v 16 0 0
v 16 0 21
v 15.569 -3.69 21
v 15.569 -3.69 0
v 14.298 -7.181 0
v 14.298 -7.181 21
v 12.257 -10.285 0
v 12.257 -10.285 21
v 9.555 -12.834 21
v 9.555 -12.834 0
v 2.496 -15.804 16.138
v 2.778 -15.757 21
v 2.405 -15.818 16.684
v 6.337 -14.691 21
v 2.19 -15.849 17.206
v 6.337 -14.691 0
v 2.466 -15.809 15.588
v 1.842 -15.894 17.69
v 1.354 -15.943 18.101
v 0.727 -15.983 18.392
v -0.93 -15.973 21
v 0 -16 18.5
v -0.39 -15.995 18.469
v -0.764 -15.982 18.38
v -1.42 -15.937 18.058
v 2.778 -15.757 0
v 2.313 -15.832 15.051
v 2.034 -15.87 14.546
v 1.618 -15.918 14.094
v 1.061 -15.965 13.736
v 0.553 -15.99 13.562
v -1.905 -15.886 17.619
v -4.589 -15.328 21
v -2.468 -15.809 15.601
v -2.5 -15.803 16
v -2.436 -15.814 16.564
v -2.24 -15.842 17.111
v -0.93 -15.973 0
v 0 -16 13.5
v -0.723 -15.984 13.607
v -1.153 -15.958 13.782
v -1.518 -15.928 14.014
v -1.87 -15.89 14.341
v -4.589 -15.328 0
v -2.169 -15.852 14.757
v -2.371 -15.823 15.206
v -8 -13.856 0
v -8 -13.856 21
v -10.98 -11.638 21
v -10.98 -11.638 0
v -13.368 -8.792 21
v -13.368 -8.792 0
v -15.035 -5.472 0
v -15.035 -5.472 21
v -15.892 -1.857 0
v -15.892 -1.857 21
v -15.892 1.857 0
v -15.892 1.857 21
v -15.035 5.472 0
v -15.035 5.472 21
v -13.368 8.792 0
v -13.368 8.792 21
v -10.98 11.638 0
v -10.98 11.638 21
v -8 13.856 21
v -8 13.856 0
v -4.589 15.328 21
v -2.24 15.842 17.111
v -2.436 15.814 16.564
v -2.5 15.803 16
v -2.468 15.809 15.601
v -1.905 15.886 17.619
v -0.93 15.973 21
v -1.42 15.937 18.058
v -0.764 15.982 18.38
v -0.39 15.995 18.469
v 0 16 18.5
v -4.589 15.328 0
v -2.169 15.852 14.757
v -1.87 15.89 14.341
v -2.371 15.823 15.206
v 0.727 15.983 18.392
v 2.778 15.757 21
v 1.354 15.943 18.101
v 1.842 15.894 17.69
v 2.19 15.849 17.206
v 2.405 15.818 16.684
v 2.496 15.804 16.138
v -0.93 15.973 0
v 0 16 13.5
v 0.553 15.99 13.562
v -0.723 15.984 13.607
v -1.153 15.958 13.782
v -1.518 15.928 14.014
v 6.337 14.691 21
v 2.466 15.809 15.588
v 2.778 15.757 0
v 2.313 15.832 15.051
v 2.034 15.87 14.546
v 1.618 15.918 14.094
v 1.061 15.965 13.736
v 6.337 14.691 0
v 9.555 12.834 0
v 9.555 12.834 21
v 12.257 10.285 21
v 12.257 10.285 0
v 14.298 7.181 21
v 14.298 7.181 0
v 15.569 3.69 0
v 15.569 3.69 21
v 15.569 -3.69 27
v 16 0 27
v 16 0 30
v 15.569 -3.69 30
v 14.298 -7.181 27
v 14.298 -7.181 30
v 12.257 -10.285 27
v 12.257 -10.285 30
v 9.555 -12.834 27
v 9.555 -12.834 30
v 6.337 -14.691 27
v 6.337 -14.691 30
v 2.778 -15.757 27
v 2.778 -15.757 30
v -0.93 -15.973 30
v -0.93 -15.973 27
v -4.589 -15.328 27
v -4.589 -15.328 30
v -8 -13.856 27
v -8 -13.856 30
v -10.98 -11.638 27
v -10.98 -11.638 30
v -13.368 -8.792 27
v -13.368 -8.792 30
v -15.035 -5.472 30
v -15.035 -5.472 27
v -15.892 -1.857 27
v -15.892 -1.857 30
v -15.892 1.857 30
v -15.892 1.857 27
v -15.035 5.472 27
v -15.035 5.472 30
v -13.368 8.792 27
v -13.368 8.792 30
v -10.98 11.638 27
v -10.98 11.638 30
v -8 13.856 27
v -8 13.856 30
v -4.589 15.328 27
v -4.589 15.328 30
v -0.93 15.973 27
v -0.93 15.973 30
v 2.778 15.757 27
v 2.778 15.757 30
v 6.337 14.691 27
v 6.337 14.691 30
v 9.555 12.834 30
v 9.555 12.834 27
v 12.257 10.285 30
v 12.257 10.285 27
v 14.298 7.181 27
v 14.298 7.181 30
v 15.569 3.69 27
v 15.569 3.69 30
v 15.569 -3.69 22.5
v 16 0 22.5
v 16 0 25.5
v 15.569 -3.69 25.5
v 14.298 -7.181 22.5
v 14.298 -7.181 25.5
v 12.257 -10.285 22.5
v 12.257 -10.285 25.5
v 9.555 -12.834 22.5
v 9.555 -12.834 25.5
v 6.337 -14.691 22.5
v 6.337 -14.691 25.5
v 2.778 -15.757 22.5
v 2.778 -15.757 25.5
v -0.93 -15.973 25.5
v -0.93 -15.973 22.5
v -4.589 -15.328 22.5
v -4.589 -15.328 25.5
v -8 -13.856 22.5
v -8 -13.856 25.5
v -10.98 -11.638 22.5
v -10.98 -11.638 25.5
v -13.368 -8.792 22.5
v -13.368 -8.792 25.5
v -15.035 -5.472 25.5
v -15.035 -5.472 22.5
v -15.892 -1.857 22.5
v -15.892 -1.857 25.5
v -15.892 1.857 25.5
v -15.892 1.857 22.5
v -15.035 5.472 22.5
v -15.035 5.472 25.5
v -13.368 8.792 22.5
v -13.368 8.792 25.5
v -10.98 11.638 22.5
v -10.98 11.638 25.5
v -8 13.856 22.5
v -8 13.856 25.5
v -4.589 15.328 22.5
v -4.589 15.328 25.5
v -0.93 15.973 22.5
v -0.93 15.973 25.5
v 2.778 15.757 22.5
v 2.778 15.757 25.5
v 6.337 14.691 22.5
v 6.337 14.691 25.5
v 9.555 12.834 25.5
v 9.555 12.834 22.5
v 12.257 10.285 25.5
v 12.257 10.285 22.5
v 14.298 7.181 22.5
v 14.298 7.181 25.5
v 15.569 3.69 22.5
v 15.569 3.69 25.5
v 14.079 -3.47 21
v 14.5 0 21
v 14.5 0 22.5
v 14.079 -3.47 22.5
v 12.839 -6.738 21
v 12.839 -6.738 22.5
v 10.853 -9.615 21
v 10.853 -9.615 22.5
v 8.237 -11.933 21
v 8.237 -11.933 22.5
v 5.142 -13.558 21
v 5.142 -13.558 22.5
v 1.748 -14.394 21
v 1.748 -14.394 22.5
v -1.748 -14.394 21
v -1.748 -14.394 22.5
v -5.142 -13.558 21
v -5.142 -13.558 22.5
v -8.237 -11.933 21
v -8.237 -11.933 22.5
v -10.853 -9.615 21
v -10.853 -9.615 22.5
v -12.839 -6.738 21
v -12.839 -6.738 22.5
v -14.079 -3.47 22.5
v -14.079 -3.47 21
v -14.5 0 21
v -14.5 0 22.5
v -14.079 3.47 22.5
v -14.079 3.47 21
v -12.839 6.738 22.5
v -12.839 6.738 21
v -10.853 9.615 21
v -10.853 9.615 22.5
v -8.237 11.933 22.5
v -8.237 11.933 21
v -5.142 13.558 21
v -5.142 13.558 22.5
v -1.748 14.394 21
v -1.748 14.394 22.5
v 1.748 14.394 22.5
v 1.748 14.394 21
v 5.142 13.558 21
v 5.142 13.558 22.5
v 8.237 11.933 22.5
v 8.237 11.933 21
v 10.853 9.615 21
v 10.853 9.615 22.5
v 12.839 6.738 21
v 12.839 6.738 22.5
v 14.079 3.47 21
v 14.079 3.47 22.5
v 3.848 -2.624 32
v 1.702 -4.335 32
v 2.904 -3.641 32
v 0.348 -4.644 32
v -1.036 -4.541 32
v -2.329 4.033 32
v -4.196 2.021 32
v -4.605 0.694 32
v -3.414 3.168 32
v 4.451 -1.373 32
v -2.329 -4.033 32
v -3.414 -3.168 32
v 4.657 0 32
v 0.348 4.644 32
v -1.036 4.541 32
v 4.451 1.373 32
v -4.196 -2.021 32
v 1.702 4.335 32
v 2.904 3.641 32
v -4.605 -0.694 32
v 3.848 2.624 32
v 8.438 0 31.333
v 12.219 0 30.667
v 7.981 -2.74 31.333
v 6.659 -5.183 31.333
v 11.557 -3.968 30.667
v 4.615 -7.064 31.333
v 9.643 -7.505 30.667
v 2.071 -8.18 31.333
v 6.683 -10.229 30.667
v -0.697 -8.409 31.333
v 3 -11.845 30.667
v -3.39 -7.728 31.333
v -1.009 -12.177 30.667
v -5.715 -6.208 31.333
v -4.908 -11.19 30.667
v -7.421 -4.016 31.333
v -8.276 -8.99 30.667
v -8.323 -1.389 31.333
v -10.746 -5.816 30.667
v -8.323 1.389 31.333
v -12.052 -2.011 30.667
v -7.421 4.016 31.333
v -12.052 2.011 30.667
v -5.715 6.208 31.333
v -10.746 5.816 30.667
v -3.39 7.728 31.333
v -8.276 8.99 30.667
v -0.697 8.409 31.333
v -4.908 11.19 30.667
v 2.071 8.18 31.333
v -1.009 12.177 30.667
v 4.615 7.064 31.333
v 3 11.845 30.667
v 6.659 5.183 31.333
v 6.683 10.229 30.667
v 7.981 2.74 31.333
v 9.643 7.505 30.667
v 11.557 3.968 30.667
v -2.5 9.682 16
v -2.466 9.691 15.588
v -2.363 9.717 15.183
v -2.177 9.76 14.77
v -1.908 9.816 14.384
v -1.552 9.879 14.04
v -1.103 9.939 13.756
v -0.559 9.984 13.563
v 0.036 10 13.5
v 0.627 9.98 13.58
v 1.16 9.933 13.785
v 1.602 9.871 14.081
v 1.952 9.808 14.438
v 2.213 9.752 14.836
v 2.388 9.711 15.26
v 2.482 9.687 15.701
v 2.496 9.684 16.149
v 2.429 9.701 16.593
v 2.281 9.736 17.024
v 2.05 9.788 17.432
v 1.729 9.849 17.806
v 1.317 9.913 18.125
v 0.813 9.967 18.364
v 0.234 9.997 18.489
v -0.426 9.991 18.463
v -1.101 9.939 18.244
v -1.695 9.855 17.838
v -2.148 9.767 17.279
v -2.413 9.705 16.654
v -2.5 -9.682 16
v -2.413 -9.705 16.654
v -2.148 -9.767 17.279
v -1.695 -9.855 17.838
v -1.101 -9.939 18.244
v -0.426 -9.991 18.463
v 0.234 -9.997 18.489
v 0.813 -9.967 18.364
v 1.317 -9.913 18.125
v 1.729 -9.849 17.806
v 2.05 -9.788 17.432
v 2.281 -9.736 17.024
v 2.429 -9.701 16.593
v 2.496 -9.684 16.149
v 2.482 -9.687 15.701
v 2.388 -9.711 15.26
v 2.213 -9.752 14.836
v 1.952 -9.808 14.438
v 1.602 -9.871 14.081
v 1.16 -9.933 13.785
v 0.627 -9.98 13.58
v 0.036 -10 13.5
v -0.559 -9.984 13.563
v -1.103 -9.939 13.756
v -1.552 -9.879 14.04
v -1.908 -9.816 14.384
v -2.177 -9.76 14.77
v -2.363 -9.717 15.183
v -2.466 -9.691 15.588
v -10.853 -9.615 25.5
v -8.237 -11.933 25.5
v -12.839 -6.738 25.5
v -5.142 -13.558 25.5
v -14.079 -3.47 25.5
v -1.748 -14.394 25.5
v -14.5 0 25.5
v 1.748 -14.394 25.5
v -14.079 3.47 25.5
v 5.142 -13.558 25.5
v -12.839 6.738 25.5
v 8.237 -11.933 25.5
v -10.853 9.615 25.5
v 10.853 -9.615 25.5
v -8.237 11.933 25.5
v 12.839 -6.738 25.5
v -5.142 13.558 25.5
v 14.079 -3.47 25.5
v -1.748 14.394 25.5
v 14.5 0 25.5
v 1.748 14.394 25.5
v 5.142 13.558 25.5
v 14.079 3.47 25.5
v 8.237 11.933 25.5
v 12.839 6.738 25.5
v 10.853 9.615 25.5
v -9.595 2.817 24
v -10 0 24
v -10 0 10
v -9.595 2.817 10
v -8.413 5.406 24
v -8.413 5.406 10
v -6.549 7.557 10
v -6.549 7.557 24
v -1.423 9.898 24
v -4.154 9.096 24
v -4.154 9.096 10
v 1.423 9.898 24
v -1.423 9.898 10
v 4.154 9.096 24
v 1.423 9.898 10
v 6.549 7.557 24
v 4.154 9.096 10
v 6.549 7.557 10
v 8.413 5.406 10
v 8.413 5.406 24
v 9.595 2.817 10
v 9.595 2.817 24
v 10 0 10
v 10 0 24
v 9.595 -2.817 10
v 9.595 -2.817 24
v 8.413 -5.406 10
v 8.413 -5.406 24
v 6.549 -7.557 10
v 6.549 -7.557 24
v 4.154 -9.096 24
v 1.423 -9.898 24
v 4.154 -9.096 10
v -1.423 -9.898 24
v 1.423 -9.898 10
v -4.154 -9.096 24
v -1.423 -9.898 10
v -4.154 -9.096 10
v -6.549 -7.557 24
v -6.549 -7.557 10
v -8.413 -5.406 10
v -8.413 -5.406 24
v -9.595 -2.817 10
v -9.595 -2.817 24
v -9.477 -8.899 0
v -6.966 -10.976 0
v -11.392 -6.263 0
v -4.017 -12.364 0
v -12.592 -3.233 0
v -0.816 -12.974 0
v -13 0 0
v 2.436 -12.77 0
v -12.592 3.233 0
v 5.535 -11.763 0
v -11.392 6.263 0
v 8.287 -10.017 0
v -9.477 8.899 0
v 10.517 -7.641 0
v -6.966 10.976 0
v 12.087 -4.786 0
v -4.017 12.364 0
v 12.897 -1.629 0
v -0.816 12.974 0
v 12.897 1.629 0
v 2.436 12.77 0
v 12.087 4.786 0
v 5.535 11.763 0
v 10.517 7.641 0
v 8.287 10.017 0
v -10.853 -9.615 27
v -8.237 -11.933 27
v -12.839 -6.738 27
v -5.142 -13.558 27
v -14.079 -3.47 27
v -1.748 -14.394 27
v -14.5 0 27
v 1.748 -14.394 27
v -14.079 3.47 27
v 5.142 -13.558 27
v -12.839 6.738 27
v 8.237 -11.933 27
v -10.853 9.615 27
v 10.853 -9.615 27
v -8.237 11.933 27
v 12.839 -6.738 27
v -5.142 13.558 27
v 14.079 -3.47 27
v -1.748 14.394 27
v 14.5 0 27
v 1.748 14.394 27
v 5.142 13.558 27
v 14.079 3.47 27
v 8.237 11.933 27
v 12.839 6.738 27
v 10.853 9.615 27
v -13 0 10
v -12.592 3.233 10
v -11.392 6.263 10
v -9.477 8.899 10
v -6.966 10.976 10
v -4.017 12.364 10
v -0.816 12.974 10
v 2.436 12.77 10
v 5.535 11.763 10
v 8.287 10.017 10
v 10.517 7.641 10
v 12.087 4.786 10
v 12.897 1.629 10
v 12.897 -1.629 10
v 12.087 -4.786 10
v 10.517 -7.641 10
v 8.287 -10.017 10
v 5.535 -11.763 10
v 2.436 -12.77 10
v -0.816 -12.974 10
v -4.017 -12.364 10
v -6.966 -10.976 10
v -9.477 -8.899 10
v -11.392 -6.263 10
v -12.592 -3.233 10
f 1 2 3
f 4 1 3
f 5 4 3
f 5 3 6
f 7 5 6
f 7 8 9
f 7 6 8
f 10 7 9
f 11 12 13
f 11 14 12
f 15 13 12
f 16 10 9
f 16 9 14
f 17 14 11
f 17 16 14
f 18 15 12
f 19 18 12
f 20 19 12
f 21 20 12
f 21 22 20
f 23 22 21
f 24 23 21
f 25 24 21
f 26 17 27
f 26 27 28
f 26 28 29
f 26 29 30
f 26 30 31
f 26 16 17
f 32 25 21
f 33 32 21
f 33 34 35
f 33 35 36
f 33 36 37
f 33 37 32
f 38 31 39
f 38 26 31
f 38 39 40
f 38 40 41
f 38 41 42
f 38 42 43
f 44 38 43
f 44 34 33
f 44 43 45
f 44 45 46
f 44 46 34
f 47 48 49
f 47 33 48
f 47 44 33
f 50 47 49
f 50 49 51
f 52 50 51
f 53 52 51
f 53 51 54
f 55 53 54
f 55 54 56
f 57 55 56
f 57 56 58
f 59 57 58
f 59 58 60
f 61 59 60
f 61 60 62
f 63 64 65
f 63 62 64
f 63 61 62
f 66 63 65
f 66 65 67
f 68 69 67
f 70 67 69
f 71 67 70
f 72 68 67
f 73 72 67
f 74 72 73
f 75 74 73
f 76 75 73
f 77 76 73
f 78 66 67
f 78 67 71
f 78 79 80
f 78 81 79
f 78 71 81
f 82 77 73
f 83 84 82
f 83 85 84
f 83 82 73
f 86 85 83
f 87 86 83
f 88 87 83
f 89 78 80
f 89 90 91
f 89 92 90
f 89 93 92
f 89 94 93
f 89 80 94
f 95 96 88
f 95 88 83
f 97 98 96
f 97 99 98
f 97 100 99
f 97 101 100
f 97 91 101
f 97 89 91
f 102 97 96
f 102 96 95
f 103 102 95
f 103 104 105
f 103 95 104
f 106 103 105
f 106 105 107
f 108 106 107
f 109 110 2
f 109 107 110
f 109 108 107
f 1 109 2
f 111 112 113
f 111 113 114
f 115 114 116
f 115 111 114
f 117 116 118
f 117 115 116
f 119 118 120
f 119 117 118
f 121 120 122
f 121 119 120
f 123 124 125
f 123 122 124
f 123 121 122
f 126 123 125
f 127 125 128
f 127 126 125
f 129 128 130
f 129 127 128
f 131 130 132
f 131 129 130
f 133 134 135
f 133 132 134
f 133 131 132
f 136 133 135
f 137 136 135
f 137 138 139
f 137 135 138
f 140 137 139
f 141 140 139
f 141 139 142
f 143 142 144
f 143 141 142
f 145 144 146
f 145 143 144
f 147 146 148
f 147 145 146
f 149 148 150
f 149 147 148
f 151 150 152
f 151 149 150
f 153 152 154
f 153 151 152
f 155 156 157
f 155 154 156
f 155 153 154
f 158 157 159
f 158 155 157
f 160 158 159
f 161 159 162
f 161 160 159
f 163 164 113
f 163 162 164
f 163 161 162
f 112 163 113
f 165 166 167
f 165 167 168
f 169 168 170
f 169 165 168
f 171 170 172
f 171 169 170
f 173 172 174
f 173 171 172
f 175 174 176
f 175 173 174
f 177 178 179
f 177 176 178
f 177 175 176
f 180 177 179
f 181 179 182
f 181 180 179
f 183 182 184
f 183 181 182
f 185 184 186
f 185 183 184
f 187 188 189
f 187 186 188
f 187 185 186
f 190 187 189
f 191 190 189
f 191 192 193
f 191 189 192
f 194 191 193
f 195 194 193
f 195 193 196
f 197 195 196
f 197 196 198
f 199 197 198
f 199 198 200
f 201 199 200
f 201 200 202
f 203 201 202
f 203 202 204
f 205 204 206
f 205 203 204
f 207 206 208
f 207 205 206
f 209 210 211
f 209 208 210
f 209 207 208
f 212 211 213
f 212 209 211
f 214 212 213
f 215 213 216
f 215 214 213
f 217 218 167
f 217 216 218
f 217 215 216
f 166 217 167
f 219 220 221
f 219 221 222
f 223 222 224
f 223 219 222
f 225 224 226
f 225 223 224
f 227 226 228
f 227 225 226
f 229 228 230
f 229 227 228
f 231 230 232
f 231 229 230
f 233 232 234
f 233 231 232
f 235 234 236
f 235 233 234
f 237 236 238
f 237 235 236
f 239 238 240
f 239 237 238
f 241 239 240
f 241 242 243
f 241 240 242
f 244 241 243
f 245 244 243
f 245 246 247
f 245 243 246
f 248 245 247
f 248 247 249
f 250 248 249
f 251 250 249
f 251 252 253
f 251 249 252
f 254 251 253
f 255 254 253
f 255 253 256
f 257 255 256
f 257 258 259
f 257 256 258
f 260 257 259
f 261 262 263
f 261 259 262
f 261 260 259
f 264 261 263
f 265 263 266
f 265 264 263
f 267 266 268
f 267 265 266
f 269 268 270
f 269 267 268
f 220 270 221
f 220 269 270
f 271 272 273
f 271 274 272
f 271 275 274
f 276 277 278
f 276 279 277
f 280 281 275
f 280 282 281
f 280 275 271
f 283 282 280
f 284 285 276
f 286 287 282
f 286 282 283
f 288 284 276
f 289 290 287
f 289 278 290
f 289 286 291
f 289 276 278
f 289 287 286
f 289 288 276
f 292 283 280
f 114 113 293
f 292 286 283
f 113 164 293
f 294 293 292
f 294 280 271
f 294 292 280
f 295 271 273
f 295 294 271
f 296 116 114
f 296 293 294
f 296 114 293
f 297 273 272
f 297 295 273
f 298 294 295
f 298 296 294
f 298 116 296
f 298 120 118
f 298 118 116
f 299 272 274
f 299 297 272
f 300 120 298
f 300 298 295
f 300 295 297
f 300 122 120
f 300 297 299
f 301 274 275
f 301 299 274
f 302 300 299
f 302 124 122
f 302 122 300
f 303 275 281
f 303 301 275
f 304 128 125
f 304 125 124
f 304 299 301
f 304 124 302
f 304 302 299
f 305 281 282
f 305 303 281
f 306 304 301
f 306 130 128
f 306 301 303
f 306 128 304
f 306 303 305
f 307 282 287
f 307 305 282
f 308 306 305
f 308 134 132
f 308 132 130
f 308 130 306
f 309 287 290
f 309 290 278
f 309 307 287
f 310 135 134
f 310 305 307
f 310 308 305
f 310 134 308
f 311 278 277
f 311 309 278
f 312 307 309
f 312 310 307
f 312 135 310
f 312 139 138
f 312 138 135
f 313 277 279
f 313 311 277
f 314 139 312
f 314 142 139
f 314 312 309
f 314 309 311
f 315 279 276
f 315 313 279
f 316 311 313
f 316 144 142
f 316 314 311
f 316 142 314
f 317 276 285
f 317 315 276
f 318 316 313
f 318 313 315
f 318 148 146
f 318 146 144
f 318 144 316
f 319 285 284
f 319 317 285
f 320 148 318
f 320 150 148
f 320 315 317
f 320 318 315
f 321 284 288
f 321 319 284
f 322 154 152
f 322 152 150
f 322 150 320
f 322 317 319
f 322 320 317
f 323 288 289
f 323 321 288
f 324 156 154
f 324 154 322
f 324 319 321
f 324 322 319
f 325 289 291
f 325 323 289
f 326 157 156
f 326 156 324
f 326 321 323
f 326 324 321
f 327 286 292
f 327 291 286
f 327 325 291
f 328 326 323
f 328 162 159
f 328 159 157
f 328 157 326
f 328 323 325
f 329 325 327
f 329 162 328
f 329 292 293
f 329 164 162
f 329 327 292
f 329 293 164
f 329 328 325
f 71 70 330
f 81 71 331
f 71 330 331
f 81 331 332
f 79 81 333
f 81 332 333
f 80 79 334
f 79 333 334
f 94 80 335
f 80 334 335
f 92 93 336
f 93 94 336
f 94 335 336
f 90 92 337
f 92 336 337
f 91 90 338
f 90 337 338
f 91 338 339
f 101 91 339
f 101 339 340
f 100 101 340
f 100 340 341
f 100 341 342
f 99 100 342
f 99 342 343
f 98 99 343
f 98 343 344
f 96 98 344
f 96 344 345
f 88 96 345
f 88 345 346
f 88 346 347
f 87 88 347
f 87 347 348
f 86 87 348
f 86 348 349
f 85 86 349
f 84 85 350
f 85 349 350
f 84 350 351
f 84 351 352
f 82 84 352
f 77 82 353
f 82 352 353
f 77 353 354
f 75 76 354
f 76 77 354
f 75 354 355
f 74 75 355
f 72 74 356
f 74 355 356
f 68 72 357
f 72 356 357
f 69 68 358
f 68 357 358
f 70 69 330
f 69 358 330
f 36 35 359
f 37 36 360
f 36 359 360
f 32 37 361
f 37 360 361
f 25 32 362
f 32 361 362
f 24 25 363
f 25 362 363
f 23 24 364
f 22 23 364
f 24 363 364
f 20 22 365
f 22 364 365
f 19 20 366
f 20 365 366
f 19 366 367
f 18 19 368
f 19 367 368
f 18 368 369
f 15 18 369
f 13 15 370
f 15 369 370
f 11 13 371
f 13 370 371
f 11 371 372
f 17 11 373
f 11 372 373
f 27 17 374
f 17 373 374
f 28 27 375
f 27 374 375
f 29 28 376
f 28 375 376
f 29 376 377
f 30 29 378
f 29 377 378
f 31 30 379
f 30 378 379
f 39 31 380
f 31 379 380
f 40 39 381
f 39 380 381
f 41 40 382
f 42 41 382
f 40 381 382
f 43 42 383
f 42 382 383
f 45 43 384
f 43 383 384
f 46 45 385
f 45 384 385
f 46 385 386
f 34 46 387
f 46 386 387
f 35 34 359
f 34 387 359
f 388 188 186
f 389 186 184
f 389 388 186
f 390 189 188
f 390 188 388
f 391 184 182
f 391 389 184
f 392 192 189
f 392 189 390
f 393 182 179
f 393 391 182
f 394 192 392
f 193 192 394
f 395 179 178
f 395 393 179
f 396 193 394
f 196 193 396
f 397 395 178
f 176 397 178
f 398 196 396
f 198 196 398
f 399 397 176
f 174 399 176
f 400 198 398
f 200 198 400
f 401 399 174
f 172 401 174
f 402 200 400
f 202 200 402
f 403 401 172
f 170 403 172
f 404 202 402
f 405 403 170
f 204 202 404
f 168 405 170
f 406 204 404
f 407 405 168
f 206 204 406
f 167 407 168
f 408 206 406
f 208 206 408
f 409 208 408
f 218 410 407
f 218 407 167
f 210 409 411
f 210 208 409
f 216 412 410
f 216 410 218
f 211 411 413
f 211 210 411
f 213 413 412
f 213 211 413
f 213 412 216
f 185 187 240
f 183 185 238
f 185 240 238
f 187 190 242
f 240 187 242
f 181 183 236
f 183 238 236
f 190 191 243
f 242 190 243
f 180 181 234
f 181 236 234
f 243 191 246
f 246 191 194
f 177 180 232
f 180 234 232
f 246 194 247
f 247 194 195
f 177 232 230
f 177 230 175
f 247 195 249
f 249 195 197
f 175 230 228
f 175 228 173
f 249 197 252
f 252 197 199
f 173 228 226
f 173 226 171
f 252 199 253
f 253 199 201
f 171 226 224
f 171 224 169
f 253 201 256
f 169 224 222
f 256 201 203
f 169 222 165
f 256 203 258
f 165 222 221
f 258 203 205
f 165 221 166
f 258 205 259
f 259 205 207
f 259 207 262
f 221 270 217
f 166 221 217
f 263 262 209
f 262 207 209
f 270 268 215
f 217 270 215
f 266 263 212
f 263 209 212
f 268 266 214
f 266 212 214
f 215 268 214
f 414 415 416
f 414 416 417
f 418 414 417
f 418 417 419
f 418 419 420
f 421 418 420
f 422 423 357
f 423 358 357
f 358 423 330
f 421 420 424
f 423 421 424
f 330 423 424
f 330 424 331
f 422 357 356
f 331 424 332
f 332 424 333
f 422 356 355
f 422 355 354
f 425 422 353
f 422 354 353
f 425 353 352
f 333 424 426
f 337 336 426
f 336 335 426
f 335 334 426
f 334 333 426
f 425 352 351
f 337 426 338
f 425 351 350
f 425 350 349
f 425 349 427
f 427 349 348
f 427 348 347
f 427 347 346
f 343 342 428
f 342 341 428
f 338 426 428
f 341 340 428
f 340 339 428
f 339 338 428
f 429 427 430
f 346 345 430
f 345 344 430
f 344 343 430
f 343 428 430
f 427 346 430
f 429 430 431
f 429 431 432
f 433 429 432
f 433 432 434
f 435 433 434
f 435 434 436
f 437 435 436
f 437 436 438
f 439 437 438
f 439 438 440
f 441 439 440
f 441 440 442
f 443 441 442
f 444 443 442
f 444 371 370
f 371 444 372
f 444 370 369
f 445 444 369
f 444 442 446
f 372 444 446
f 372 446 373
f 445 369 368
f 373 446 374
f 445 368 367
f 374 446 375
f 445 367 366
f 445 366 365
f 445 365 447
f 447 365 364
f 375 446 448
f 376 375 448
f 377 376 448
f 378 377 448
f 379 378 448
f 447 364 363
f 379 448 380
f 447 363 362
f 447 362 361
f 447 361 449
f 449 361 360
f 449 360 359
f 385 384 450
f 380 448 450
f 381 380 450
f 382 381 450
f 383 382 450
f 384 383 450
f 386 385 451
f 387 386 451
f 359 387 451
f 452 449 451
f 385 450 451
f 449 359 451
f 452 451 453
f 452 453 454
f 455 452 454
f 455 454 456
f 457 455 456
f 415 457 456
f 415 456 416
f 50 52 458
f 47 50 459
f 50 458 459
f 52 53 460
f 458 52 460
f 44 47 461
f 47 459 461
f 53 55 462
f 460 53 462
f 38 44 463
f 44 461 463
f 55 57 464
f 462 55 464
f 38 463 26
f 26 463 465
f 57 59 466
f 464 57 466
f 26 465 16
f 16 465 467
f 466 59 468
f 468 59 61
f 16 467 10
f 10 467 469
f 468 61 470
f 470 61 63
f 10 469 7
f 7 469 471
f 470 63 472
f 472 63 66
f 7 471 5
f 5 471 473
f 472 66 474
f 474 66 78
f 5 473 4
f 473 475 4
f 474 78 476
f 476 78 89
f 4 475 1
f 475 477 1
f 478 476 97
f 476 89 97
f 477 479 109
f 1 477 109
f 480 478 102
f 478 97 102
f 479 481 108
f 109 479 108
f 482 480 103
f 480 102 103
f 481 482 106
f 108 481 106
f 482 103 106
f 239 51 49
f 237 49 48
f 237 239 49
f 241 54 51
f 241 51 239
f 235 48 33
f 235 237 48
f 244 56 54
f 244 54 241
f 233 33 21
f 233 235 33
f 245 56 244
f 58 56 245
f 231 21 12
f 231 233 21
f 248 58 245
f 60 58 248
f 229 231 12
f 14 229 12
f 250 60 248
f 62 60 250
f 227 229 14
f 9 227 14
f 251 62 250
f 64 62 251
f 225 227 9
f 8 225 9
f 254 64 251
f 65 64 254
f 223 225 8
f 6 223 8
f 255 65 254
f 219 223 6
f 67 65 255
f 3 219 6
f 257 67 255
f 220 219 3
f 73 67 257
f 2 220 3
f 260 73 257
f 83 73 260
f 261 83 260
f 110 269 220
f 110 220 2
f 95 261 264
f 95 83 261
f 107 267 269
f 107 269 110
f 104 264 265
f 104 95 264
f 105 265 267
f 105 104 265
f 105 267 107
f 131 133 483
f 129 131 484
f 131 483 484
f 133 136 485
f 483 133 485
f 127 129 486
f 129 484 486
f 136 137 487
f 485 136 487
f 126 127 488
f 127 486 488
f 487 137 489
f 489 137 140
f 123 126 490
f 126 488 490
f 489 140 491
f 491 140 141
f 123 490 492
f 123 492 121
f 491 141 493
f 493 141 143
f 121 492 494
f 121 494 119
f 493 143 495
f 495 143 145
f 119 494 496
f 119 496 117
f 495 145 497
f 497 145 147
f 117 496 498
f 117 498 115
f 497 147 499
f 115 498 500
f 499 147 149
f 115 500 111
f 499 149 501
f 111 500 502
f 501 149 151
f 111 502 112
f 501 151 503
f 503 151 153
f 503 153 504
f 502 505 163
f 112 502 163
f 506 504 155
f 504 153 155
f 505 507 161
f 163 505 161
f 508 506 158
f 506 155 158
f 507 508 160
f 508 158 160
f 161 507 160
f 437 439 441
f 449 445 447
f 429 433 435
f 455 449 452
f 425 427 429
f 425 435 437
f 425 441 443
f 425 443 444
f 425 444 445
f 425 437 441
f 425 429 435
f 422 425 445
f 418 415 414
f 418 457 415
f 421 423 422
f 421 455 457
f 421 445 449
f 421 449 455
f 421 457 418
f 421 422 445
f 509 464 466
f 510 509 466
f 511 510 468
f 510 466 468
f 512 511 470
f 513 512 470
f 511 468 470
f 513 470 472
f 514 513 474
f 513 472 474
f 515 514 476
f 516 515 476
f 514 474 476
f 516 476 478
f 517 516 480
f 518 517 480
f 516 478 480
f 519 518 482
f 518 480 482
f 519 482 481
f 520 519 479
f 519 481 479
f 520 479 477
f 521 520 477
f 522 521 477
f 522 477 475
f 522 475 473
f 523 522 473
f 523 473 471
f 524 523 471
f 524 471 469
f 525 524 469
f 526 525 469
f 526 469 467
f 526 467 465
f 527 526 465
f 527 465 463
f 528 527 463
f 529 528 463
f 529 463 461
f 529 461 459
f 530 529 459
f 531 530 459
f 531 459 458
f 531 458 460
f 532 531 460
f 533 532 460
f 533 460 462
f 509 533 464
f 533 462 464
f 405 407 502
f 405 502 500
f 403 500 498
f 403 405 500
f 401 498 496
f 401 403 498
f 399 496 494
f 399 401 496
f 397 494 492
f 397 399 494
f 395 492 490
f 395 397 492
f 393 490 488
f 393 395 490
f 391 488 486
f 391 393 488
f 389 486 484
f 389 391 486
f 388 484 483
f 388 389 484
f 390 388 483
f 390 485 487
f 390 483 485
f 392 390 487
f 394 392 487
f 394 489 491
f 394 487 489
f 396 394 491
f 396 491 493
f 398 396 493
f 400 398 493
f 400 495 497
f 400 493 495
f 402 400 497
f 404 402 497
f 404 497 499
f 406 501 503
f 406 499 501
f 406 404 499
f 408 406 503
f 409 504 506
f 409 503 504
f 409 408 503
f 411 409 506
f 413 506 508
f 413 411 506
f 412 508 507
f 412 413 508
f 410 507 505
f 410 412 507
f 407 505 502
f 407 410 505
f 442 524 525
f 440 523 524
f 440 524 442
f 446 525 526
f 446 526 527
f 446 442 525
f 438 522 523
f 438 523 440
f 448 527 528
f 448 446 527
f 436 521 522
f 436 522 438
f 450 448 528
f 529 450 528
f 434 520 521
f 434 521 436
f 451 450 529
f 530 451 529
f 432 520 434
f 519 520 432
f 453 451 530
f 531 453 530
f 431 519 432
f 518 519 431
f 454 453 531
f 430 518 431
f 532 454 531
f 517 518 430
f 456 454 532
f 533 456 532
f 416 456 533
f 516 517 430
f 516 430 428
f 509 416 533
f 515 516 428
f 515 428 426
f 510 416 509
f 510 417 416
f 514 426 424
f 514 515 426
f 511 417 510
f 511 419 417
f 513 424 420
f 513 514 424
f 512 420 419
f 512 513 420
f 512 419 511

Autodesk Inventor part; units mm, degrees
ref_plane "YZ Plane" through (0, 0, 0) normal (1, 0, 0) x (0, 1, 0)
ref_plane "XZ Plane" through (0, 0, 0) normal (0, 1, 0) x (-1, 0, 0)
ref_plane "XY Plane" through (0, 0, 0) normal (0, 0, 1) x (1, 0, 0)
sketch "Sketch1" plane through (0, 0, 0) normal (0, 0, 1) x (1, 0, 0)
  circle A0 centre (0, 0) radius 16
  dimension "d0" = 32
extrude "Extrusion1" add sketch "Sketch1" along normal blind 21
sketch "Sketch2" plane through (0, 0, 21) normal (0, 0, 1) x (1, 0, 0)
  circle A0 centre (0, 0) radius 14.5
  dimension "d3" = 29
extrude "Extrusion2" add sketch "Sketch2" along normal blind 1.5
sketch "Sketch3" plane through (0, 0, 22.5) normal (0, 0, 1) x (1, 0, 0)
  circle A0 centre (0, 0) radius 16
  dimension "d6" = 32
extrude "Extrusion3" add sketch "Sketch3" along normal blind 3
sketch "Sketch4" plane through (0, 0, 25.5) normal (0, 0, 1) x (1, 0, 0)
  circle A0 centre (0, 0) radius 14.5
  dimension "d9" = 29
extrude "Extrusion4" add sketch "Sketch4" along normal blind 1.5
sketch "Sketch5" plane through (0, 0, 27) normal (0, 0, 1) x (1, 0, 0)
  circle A0 centre (0, 0) radius 16
  dimension "d12" = 32
extrude "Extrusion5" add sketch "Sketch5" along normal blind 3
sketch "Sketch6" plane through (0, 0, 30) normal (0, 0, 1) x (1, 0, 0)
  circle A0 centre (0, 0) radius 16
  dimension "d15" = 32
extrude "Extrusion6" add sketch "Sketch6" along normal blind 2 draft -80
sketch "Sketch7" plane through (0, 0, 0) normal (0, 0, -1) x (-1, 0, 0)
  circle A0 centre (0, 0) radius 13
  dimension "d18" = 26
extrude "Extrusion7" cut sketch "Sketch7" against normal blind 10
sketch "Sketch8" plane through (0, 0, 10) normal (0, 0, -1) x (-1, 0, 0)
  circle A0 centre (0, 0) radius 10
  dimension "d21" = 20
extrude "Extrusion8" cut sketch "Sketch8" against normal blind 14
sketch "Sketch9" plane through (0, 0, 0) normal (0, 1, 0) x (-1, 0, 0)
  circle A0 centre (0, 16) radius 2.5
  point P0 (0, 0)
  dimension "d24" = 5
extrude "Extrusion9" cut sketch "Sketch9" along normal mid plane 32
properties part number "piston"
